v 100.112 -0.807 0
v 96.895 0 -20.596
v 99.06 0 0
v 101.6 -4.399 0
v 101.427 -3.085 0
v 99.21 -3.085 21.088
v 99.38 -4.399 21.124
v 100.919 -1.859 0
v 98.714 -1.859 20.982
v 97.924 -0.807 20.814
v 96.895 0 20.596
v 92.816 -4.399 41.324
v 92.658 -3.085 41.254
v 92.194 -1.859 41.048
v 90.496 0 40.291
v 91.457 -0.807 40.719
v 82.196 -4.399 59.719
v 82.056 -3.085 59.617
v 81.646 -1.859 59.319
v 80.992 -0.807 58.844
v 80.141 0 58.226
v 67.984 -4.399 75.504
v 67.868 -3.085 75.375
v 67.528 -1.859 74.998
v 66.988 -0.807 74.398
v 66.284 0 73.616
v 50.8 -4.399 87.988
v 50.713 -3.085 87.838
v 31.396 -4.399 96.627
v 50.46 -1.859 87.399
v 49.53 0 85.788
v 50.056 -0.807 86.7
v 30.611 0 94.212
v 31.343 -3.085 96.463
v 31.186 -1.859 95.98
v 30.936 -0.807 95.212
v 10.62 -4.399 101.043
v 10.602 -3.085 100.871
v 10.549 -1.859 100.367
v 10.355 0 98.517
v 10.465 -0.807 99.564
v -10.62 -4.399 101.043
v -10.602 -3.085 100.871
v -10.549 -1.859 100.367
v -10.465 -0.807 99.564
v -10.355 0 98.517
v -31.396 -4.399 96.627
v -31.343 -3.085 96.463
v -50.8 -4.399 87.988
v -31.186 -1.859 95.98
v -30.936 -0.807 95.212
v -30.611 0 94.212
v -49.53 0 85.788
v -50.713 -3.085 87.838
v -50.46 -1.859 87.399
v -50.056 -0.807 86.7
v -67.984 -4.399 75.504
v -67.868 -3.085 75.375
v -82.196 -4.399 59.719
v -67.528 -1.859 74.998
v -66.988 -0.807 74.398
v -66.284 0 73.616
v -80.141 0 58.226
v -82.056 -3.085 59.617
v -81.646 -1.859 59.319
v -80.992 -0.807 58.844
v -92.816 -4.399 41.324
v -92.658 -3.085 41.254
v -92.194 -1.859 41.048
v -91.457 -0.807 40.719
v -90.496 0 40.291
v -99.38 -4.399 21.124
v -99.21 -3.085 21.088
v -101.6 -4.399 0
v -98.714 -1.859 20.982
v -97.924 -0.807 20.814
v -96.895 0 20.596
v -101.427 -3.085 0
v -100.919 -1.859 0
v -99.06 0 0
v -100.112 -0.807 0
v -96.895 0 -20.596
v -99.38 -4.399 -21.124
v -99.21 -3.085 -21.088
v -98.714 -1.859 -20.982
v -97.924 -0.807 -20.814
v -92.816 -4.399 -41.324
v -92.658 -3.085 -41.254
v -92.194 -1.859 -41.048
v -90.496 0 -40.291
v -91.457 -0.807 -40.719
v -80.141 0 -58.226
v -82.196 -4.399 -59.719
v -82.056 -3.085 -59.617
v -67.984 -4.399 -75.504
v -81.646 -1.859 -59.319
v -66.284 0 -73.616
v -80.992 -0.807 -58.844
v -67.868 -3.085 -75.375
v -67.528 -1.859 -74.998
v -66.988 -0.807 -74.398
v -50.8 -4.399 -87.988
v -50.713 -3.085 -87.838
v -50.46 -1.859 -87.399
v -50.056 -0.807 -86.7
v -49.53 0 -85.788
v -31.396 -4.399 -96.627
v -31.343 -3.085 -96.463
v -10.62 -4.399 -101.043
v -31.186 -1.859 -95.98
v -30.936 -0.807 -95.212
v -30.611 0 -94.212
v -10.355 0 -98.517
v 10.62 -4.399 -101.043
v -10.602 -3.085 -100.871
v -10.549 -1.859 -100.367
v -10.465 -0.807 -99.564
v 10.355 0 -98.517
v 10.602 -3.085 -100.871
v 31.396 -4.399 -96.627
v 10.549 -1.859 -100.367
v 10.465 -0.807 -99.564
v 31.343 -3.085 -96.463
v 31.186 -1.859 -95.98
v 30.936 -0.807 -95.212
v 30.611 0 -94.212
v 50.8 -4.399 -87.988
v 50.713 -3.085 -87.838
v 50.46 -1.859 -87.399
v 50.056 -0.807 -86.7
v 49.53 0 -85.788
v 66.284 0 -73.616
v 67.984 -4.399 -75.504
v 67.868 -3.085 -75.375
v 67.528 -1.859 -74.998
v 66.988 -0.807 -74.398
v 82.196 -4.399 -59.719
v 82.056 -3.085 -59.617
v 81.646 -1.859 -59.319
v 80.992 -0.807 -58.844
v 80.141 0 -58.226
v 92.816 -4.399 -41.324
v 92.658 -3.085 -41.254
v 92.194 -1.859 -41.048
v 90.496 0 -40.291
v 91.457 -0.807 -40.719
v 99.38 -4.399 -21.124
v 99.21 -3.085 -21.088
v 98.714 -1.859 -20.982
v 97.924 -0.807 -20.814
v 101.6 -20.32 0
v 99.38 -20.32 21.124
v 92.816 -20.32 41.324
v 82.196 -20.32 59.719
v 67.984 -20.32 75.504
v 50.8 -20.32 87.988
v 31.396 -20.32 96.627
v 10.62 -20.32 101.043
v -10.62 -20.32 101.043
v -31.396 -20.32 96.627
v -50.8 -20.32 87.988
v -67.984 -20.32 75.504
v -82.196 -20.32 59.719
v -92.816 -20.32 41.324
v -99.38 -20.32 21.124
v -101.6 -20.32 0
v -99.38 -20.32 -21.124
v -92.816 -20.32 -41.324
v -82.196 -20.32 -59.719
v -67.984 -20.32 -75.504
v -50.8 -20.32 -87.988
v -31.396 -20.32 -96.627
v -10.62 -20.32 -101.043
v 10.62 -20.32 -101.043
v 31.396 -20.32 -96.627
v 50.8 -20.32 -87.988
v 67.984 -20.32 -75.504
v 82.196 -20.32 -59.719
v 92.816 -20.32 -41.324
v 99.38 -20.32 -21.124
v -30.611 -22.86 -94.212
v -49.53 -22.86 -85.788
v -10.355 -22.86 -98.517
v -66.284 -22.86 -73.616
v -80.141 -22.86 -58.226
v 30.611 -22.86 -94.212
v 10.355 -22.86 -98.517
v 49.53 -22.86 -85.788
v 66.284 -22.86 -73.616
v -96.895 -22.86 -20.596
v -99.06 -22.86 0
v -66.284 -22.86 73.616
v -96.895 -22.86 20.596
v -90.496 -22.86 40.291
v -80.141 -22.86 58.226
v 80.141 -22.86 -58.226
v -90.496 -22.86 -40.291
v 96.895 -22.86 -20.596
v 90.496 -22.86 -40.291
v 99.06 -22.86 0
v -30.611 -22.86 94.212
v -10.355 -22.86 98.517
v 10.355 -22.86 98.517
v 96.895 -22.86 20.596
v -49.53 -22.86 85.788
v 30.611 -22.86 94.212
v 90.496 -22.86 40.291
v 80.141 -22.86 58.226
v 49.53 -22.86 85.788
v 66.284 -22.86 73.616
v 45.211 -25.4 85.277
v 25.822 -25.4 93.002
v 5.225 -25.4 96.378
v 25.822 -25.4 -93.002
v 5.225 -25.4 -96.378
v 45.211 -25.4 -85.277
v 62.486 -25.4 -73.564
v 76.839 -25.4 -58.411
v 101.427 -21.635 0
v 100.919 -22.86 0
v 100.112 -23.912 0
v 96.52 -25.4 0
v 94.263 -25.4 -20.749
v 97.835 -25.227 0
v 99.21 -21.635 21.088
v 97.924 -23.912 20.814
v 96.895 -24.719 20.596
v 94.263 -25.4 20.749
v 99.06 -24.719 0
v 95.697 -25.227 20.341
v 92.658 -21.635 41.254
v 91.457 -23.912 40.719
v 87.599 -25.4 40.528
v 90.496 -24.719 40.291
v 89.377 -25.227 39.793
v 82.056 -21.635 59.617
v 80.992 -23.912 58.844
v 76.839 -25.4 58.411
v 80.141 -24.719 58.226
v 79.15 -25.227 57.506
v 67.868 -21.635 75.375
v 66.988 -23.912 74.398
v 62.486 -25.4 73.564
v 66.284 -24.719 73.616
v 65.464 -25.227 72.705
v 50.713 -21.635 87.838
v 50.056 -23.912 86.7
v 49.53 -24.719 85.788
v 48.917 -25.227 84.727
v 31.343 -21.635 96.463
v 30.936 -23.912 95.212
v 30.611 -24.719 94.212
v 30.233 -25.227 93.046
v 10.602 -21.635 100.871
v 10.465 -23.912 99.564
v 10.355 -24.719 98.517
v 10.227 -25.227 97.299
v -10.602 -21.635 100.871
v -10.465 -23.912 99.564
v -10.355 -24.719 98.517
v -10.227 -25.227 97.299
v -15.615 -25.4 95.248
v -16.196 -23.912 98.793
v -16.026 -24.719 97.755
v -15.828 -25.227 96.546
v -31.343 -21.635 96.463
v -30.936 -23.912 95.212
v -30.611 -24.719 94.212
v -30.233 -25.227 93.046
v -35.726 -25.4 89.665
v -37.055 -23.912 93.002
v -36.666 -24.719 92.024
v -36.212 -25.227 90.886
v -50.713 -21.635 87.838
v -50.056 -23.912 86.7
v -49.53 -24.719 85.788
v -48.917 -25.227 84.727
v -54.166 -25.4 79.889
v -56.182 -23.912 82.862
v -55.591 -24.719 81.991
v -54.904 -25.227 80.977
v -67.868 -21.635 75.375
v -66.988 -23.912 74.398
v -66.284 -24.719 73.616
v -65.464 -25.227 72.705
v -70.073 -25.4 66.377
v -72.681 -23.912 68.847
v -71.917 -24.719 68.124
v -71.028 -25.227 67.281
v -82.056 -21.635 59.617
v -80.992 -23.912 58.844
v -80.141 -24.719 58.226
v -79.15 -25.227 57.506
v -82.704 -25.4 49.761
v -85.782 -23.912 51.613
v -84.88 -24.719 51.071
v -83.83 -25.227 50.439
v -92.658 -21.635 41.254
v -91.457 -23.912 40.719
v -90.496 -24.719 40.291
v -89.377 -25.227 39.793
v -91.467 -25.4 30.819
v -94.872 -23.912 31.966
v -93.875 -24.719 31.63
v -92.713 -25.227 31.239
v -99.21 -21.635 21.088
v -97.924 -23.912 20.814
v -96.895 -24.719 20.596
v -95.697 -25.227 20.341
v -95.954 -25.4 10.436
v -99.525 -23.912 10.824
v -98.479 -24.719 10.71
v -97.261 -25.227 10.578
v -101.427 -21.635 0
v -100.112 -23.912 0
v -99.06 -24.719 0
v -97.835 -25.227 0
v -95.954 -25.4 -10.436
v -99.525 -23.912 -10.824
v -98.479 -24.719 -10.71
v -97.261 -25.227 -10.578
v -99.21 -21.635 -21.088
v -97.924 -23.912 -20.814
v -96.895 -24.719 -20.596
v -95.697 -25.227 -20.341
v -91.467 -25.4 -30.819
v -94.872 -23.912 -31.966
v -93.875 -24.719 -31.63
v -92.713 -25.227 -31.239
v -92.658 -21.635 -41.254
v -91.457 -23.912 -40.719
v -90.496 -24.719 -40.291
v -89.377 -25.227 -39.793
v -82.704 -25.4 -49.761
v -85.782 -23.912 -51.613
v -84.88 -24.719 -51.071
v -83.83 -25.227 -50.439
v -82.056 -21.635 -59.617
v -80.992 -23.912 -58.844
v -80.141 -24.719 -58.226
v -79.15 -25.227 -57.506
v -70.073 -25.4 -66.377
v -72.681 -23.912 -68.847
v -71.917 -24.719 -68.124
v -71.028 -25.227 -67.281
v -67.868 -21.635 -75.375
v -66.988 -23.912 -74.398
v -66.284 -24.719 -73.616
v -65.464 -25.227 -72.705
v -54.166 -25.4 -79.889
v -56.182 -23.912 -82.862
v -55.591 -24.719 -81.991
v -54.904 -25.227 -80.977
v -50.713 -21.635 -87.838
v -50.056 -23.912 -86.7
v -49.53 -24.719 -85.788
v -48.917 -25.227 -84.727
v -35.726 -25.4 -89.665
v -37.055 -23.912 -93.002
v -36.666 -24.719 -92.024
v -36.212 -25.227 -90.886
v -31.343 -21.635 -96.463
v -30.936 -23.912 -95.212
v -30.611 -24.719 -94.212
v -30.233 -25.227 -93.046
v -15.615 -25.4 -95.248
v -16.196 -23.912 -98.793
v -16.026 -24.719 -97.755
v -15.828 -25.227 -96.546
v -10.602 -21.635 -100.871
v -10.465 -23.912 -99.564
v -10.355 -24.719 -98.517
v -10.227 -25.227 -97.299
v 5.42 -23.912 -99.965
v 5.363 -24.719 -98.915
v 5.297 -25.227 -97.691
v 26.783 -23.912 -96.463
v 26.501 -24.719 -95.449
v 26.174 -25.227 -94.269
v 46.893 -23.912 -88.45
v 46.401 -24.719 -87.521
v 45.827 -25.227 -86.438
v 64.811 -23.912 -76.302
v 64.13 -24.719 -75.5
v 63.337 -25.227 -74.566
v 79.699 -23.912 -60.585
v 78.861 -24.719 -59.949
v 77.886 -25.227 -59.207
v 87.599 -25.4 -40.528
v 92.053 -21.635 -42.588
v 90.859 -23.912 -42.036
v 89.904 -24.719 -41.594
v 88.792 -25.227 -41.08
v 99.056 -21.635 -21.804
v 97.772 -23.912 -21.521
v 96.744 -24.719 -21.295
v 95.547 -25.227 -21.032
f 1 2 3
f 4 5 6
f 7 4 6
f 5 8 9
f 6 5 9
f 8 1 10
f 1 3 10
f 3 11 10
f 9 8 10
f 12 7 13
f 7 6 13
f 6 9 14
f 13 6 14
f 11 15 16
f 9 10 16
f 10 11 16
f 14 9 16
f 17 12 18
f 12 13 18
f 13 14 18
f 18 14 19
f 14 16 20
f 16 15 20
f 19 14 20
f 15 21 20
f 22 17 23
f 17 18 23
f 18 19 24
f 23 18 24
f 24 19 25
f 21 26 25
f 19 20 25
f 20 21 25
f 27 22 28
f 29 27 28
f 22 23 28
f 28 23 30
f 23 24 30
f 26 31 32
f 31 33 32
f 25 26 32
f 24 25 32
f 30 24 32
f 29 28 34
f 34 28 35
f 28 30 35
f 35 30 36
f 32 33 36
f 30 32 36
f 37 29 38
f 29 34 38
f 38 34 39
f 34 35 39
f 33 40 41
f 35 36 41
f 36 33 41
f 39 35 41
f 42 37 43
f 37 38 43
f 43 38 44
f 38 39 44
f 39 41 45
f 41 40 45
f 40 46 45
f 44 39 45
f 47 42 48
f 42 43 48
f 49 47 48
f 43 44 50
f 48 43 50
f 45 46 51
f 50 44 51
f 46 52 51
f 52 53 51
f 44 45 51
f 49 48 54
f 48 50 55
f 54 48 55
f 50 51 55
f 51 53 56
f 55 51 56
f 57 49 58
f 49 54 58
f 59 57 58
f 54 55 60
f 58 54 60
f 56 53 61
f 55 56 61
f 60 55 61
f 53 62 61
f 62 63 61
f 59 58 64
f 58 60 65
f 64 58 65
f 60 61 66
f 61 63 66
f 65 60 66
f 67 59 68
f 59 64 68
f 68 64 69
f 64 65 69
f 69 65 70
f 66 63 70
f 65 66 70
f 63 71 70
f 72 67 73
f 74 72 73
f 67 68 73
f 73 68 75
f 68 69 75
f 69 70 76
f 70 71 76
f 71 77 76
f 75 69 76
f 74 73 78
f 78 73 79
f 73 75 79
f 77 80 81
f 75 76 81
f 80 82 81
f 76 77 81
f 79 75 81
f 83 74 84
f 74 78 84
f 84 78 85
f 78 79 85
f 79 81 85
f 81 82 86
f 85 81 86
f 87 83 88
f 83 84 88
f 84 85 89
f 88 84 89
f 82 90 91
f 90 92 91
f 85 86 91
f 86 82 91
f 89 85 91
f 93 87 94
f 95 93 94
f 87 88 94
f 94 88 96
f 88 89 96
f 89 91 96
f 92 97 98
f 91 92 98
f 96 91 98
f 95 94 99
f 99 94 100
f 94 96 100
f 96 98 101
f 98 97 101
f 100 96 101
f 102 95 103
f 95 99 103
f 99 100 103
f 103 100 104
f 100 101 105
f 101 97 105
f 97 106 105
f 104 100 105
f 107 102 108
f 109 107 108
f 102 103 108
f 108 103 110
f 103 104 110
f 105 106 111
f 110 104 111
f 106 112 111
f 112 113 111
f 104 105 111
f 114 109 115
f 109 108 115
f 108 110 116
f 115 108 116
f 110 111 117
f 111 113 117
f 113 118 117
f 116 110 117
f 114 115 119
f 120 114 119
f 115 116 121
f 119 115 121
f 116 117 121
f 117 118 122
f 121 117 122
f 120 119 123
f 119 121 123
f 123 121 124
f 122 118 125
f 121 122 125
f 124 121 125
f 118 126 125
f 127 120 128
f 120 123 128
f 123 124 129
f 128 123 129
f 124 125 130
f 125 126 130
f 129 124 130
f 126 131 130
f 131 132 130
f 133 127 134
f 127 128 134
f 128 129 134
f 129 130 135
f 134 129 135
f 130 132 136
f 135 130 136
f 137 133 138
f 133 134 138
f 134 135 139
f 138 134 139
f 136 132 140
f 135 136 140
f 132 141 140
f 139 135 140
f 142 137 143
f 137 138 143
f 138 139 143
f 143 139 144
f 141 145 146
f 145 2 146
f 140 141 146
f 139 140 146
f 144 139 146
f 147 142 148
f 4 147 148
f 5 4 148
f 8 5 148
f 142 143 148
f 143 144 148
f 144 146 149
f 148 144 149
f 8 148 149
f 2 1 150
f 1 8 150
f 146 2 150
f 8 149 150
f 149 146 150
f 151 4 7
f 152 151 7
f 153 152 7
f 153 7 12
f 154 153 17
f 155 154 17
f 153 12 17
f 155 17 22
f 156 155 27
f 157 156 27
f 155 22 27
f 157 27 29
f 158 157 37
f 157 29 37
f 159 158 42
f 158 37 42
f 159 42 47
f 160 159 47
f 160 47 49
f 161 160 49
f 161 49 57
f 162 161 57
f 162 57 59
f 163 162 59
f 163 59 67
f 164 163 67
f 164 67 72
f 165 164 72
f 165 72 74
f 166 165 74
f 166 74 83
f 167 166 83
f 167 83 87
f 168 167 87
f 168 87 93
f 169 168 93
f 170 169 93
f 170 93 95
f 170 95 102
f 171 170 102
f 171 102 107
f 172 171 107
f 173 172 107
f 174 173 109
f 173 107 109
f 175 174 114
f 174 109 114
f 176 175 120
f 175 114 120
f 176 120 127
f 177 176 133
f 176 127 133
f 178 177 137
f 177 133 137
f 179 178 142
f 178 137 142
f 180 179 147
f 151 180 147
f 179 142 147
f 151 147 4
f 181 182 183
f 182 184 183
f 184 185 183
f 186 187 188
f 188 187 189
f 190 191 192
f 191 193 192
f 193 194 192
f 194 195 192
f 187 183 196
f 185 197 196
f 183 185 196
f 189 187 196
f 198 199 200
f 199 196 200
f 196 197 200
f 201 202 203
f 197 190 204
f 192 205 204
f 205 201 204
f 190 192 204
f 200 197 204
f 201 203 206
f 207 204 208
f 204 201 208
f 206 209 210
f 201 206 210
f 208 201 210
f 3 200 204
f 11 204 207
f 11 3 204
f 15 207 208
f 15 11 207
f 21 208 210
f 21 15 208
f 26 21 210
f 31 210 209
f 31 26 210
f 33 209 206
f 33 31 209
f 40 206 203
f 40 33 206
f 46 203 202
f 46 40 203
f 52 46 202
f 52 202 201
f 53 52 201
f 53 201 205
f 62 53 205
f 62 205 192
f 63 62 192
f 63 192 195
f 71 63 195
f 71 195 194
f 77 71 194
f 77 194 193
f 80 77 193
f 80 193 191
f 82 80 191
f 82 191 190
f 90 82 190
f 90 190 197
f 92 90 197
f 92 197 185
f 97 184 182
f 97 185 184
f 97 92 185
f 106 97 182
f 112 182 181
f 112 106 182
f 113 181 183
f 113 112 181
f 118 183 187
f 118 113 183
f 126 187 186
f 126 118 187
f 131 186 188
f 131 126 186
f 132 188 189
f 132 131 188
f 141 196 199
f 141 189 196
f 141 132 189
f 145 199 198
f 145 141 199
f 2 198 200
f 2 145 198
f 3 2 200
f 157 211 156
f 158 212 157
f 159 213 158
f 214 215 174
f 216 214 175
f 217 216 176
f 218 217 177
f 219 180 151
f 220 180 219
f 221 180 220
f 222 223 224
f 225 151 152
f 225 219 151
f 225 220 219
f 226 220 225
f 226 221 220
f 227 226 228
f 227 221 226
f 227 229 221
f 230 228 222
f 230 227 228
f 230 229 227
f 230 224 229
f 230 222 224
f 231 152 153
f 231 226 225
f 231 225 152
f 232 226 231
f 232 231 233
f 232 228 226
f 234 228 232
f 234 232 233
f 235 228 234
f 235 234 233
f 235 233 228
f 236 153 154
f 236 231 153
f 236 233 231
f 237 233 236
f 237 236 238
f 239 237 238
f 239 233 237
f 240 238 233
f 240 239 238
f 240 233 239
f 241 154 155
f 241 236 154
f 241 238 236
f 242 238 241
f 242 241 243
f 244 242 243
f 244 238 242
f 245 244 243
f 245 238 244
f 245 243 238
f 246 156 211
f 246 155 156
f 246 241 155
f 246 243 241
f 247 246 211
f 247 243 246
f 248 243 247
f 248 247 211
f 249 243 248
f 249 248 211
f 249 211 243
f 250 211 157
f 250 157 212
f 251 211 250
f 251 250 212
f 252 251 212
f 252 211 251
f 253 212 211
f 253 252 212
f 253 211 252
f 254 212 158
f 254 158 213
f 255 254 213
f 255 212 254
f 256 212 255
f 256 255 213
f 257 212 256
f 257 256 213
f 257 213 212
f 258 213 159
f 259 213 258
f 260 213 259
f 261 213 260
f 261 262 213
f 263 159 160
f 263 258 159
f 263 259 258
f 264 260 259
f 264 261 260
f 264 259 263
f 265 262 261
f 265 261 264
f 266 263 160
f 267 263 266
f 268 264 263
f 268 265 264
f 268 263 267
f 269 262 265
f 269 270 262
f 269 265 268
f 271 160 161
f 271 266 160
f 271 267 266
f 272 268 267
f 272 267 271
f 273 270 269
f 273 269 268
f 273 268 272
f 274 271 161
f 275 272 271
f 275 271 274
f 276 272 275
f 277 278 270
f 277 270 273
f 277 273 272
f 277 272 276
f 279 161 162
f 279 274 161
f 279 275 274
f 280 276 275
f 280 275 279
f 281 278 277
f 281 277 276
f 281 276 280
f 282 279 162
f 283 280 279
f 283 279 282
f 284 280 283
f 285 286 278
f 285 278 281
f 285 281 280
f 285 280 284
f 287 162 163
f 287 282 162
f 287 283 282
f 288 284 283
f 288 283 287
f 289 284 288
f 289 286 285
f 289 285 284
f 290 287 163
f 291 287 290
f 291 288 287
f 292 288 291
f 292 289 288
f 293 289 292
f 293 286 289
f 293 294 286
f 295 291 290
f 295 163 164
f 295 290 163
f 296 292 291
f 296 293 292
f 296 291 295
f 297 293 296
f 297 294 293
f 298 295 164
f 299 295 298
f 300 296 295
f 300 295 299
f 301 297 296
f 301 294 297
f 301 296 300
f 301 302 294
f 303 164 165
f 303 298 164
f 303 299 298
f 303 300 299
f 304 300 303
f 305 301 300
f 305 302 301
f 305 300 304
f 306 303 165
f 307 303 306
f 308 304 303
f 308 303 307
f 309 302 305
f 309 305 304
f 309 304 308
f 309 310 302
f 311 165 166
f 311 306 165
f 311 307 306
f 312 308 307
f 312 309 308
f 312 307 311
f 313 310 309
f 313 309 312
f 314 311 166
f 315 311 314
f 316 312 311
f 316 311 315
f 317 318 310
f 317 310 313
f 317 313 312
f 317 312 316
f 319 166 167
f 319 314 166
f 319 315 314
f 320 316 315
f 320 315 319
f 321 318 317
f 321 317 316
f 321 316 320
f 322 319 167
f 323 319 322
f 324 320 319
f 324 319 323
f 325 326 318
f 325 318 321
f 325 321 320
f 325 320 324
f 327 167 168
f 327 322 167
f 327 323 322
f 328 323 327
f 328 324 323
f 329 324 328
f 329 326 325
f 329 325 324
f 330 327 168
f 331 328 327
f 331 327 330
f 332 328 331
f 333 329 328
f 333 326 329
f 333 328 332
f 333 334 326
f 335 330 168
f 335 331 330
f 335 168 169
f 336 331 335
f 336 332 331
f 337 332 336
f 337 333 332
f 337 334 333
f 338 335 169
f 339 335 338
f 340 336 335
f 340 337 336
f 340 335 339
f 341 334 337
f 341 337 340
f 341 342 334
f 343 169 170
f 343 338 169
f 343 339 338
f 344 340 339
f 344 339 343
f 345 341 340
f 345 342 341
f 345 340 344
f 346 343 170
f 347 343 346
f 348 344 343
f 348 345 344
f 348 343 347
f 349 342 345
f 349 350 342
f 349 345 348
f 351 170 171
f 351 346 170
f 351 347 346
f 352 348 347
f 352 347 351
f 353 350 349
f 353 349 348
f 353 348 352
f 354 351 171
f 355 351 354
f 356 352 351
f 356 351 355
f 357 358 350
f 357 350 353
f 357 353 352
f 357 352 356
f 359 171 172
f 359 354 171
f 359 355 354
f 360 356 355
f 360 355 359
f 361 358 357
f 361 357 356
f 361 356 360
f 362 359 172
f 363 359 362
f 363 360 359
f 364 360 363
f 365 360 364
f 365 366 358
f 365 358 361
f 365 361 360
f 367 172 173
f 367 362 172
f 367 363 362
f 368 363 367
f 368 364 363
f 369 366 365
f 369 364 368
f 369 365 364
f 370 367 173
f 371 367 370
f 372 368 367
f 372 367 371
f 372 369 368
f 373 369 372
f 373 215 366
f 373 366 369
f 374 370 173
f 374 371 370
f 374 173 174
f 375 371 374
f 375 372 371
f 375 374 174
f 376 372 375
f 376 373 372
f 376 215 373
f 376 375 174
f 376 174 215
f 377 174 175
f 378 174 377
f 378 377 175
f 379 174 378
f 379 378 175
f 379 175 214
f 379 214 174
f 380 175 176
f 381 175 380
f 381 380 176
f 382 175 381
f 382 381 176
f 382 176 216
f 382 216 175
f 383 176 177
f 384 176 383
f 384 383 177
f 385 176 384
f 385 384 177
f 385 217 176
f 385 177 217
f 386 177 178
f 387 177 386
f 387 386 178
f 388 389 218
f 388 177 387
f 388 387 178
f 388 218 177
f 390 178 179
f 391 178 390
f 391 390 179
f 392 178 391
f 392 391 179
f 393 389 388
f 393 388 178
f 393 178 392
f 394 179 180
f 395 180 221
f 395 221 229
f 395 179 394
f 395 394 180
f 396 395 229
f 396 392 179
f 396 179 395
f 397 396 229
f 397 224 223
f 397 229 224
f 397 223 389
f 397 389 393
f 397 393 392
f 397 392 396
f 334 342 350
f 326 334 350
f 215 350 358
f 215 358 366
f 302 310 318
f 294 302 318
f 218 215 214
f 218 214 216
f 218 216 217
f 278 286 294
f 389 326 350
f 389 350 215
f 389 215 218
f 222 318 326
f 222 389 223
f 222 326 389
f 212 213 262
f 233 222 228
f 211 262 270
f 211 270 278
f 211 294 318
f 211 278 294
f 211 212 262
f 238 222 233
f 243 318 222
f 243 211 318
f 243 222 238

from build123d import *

# Parameters (mm, degrees)
F0_R     = 101.6
F1_DEPTH = 25.4
F2_T     = -2.54


# Not quite as in the source:
# - a fillet or chamfer that OpenCascade refuses, or shapes differently, is made with other operations: its cross-section is extruded or revolved along the edge and cut away or added


with BuildPart() as f1:
    # F0 (on Front) → F1 (new body)
    with BuildSketch(Plane.XZ):
        Circle(F0_R)
    extrude(amount=F1_DEPTH)

    # F2
    f2_openings = [f1.faces().sort_by_distance(p)[0] for p in [
        (0, 0, 0),
    ]]
    offset(amount=F2_T, openings=f2_openings)

    # F3: fillet of radius 5.08 on 2 edges, made by hand

    # F3_s1 → F3_t2 (revolve, cut)
    with BuildSketch(Plane.XY):
        with BuildLine():
            ThreePointArc((101.6, -20.32), (100.1121024484, -23.9121024484), (96.52, -25.4))
            Line((96.52, -25.4), (101.6, -25.4))
            Line((101.6, -25.4), (101.6, -20.32))
        make_face()
    revolve(axis=Axis((0, -25.4, 0), (0, -1, 0)), mode=Mode.SUBTRACT)

    # F3_s3 → F3_t4 (revolve, cut)
    with BuildSketch(Plane.XY):
        with BuildLine():
            ThreePointArc((101.6, -4.3994090512), (100.9194090512, -1.8594090512), (99.06, 0))
            Line((99.06, 0), (101.6, 0))
            Line((101.6, 0), (101.6, -4.3994090512))
        make_face()
    revolve(axis=Axis((0, 0, 0), (0, -1, 0)), mode=Mode.SUBTRACT)


solid = f1.part
